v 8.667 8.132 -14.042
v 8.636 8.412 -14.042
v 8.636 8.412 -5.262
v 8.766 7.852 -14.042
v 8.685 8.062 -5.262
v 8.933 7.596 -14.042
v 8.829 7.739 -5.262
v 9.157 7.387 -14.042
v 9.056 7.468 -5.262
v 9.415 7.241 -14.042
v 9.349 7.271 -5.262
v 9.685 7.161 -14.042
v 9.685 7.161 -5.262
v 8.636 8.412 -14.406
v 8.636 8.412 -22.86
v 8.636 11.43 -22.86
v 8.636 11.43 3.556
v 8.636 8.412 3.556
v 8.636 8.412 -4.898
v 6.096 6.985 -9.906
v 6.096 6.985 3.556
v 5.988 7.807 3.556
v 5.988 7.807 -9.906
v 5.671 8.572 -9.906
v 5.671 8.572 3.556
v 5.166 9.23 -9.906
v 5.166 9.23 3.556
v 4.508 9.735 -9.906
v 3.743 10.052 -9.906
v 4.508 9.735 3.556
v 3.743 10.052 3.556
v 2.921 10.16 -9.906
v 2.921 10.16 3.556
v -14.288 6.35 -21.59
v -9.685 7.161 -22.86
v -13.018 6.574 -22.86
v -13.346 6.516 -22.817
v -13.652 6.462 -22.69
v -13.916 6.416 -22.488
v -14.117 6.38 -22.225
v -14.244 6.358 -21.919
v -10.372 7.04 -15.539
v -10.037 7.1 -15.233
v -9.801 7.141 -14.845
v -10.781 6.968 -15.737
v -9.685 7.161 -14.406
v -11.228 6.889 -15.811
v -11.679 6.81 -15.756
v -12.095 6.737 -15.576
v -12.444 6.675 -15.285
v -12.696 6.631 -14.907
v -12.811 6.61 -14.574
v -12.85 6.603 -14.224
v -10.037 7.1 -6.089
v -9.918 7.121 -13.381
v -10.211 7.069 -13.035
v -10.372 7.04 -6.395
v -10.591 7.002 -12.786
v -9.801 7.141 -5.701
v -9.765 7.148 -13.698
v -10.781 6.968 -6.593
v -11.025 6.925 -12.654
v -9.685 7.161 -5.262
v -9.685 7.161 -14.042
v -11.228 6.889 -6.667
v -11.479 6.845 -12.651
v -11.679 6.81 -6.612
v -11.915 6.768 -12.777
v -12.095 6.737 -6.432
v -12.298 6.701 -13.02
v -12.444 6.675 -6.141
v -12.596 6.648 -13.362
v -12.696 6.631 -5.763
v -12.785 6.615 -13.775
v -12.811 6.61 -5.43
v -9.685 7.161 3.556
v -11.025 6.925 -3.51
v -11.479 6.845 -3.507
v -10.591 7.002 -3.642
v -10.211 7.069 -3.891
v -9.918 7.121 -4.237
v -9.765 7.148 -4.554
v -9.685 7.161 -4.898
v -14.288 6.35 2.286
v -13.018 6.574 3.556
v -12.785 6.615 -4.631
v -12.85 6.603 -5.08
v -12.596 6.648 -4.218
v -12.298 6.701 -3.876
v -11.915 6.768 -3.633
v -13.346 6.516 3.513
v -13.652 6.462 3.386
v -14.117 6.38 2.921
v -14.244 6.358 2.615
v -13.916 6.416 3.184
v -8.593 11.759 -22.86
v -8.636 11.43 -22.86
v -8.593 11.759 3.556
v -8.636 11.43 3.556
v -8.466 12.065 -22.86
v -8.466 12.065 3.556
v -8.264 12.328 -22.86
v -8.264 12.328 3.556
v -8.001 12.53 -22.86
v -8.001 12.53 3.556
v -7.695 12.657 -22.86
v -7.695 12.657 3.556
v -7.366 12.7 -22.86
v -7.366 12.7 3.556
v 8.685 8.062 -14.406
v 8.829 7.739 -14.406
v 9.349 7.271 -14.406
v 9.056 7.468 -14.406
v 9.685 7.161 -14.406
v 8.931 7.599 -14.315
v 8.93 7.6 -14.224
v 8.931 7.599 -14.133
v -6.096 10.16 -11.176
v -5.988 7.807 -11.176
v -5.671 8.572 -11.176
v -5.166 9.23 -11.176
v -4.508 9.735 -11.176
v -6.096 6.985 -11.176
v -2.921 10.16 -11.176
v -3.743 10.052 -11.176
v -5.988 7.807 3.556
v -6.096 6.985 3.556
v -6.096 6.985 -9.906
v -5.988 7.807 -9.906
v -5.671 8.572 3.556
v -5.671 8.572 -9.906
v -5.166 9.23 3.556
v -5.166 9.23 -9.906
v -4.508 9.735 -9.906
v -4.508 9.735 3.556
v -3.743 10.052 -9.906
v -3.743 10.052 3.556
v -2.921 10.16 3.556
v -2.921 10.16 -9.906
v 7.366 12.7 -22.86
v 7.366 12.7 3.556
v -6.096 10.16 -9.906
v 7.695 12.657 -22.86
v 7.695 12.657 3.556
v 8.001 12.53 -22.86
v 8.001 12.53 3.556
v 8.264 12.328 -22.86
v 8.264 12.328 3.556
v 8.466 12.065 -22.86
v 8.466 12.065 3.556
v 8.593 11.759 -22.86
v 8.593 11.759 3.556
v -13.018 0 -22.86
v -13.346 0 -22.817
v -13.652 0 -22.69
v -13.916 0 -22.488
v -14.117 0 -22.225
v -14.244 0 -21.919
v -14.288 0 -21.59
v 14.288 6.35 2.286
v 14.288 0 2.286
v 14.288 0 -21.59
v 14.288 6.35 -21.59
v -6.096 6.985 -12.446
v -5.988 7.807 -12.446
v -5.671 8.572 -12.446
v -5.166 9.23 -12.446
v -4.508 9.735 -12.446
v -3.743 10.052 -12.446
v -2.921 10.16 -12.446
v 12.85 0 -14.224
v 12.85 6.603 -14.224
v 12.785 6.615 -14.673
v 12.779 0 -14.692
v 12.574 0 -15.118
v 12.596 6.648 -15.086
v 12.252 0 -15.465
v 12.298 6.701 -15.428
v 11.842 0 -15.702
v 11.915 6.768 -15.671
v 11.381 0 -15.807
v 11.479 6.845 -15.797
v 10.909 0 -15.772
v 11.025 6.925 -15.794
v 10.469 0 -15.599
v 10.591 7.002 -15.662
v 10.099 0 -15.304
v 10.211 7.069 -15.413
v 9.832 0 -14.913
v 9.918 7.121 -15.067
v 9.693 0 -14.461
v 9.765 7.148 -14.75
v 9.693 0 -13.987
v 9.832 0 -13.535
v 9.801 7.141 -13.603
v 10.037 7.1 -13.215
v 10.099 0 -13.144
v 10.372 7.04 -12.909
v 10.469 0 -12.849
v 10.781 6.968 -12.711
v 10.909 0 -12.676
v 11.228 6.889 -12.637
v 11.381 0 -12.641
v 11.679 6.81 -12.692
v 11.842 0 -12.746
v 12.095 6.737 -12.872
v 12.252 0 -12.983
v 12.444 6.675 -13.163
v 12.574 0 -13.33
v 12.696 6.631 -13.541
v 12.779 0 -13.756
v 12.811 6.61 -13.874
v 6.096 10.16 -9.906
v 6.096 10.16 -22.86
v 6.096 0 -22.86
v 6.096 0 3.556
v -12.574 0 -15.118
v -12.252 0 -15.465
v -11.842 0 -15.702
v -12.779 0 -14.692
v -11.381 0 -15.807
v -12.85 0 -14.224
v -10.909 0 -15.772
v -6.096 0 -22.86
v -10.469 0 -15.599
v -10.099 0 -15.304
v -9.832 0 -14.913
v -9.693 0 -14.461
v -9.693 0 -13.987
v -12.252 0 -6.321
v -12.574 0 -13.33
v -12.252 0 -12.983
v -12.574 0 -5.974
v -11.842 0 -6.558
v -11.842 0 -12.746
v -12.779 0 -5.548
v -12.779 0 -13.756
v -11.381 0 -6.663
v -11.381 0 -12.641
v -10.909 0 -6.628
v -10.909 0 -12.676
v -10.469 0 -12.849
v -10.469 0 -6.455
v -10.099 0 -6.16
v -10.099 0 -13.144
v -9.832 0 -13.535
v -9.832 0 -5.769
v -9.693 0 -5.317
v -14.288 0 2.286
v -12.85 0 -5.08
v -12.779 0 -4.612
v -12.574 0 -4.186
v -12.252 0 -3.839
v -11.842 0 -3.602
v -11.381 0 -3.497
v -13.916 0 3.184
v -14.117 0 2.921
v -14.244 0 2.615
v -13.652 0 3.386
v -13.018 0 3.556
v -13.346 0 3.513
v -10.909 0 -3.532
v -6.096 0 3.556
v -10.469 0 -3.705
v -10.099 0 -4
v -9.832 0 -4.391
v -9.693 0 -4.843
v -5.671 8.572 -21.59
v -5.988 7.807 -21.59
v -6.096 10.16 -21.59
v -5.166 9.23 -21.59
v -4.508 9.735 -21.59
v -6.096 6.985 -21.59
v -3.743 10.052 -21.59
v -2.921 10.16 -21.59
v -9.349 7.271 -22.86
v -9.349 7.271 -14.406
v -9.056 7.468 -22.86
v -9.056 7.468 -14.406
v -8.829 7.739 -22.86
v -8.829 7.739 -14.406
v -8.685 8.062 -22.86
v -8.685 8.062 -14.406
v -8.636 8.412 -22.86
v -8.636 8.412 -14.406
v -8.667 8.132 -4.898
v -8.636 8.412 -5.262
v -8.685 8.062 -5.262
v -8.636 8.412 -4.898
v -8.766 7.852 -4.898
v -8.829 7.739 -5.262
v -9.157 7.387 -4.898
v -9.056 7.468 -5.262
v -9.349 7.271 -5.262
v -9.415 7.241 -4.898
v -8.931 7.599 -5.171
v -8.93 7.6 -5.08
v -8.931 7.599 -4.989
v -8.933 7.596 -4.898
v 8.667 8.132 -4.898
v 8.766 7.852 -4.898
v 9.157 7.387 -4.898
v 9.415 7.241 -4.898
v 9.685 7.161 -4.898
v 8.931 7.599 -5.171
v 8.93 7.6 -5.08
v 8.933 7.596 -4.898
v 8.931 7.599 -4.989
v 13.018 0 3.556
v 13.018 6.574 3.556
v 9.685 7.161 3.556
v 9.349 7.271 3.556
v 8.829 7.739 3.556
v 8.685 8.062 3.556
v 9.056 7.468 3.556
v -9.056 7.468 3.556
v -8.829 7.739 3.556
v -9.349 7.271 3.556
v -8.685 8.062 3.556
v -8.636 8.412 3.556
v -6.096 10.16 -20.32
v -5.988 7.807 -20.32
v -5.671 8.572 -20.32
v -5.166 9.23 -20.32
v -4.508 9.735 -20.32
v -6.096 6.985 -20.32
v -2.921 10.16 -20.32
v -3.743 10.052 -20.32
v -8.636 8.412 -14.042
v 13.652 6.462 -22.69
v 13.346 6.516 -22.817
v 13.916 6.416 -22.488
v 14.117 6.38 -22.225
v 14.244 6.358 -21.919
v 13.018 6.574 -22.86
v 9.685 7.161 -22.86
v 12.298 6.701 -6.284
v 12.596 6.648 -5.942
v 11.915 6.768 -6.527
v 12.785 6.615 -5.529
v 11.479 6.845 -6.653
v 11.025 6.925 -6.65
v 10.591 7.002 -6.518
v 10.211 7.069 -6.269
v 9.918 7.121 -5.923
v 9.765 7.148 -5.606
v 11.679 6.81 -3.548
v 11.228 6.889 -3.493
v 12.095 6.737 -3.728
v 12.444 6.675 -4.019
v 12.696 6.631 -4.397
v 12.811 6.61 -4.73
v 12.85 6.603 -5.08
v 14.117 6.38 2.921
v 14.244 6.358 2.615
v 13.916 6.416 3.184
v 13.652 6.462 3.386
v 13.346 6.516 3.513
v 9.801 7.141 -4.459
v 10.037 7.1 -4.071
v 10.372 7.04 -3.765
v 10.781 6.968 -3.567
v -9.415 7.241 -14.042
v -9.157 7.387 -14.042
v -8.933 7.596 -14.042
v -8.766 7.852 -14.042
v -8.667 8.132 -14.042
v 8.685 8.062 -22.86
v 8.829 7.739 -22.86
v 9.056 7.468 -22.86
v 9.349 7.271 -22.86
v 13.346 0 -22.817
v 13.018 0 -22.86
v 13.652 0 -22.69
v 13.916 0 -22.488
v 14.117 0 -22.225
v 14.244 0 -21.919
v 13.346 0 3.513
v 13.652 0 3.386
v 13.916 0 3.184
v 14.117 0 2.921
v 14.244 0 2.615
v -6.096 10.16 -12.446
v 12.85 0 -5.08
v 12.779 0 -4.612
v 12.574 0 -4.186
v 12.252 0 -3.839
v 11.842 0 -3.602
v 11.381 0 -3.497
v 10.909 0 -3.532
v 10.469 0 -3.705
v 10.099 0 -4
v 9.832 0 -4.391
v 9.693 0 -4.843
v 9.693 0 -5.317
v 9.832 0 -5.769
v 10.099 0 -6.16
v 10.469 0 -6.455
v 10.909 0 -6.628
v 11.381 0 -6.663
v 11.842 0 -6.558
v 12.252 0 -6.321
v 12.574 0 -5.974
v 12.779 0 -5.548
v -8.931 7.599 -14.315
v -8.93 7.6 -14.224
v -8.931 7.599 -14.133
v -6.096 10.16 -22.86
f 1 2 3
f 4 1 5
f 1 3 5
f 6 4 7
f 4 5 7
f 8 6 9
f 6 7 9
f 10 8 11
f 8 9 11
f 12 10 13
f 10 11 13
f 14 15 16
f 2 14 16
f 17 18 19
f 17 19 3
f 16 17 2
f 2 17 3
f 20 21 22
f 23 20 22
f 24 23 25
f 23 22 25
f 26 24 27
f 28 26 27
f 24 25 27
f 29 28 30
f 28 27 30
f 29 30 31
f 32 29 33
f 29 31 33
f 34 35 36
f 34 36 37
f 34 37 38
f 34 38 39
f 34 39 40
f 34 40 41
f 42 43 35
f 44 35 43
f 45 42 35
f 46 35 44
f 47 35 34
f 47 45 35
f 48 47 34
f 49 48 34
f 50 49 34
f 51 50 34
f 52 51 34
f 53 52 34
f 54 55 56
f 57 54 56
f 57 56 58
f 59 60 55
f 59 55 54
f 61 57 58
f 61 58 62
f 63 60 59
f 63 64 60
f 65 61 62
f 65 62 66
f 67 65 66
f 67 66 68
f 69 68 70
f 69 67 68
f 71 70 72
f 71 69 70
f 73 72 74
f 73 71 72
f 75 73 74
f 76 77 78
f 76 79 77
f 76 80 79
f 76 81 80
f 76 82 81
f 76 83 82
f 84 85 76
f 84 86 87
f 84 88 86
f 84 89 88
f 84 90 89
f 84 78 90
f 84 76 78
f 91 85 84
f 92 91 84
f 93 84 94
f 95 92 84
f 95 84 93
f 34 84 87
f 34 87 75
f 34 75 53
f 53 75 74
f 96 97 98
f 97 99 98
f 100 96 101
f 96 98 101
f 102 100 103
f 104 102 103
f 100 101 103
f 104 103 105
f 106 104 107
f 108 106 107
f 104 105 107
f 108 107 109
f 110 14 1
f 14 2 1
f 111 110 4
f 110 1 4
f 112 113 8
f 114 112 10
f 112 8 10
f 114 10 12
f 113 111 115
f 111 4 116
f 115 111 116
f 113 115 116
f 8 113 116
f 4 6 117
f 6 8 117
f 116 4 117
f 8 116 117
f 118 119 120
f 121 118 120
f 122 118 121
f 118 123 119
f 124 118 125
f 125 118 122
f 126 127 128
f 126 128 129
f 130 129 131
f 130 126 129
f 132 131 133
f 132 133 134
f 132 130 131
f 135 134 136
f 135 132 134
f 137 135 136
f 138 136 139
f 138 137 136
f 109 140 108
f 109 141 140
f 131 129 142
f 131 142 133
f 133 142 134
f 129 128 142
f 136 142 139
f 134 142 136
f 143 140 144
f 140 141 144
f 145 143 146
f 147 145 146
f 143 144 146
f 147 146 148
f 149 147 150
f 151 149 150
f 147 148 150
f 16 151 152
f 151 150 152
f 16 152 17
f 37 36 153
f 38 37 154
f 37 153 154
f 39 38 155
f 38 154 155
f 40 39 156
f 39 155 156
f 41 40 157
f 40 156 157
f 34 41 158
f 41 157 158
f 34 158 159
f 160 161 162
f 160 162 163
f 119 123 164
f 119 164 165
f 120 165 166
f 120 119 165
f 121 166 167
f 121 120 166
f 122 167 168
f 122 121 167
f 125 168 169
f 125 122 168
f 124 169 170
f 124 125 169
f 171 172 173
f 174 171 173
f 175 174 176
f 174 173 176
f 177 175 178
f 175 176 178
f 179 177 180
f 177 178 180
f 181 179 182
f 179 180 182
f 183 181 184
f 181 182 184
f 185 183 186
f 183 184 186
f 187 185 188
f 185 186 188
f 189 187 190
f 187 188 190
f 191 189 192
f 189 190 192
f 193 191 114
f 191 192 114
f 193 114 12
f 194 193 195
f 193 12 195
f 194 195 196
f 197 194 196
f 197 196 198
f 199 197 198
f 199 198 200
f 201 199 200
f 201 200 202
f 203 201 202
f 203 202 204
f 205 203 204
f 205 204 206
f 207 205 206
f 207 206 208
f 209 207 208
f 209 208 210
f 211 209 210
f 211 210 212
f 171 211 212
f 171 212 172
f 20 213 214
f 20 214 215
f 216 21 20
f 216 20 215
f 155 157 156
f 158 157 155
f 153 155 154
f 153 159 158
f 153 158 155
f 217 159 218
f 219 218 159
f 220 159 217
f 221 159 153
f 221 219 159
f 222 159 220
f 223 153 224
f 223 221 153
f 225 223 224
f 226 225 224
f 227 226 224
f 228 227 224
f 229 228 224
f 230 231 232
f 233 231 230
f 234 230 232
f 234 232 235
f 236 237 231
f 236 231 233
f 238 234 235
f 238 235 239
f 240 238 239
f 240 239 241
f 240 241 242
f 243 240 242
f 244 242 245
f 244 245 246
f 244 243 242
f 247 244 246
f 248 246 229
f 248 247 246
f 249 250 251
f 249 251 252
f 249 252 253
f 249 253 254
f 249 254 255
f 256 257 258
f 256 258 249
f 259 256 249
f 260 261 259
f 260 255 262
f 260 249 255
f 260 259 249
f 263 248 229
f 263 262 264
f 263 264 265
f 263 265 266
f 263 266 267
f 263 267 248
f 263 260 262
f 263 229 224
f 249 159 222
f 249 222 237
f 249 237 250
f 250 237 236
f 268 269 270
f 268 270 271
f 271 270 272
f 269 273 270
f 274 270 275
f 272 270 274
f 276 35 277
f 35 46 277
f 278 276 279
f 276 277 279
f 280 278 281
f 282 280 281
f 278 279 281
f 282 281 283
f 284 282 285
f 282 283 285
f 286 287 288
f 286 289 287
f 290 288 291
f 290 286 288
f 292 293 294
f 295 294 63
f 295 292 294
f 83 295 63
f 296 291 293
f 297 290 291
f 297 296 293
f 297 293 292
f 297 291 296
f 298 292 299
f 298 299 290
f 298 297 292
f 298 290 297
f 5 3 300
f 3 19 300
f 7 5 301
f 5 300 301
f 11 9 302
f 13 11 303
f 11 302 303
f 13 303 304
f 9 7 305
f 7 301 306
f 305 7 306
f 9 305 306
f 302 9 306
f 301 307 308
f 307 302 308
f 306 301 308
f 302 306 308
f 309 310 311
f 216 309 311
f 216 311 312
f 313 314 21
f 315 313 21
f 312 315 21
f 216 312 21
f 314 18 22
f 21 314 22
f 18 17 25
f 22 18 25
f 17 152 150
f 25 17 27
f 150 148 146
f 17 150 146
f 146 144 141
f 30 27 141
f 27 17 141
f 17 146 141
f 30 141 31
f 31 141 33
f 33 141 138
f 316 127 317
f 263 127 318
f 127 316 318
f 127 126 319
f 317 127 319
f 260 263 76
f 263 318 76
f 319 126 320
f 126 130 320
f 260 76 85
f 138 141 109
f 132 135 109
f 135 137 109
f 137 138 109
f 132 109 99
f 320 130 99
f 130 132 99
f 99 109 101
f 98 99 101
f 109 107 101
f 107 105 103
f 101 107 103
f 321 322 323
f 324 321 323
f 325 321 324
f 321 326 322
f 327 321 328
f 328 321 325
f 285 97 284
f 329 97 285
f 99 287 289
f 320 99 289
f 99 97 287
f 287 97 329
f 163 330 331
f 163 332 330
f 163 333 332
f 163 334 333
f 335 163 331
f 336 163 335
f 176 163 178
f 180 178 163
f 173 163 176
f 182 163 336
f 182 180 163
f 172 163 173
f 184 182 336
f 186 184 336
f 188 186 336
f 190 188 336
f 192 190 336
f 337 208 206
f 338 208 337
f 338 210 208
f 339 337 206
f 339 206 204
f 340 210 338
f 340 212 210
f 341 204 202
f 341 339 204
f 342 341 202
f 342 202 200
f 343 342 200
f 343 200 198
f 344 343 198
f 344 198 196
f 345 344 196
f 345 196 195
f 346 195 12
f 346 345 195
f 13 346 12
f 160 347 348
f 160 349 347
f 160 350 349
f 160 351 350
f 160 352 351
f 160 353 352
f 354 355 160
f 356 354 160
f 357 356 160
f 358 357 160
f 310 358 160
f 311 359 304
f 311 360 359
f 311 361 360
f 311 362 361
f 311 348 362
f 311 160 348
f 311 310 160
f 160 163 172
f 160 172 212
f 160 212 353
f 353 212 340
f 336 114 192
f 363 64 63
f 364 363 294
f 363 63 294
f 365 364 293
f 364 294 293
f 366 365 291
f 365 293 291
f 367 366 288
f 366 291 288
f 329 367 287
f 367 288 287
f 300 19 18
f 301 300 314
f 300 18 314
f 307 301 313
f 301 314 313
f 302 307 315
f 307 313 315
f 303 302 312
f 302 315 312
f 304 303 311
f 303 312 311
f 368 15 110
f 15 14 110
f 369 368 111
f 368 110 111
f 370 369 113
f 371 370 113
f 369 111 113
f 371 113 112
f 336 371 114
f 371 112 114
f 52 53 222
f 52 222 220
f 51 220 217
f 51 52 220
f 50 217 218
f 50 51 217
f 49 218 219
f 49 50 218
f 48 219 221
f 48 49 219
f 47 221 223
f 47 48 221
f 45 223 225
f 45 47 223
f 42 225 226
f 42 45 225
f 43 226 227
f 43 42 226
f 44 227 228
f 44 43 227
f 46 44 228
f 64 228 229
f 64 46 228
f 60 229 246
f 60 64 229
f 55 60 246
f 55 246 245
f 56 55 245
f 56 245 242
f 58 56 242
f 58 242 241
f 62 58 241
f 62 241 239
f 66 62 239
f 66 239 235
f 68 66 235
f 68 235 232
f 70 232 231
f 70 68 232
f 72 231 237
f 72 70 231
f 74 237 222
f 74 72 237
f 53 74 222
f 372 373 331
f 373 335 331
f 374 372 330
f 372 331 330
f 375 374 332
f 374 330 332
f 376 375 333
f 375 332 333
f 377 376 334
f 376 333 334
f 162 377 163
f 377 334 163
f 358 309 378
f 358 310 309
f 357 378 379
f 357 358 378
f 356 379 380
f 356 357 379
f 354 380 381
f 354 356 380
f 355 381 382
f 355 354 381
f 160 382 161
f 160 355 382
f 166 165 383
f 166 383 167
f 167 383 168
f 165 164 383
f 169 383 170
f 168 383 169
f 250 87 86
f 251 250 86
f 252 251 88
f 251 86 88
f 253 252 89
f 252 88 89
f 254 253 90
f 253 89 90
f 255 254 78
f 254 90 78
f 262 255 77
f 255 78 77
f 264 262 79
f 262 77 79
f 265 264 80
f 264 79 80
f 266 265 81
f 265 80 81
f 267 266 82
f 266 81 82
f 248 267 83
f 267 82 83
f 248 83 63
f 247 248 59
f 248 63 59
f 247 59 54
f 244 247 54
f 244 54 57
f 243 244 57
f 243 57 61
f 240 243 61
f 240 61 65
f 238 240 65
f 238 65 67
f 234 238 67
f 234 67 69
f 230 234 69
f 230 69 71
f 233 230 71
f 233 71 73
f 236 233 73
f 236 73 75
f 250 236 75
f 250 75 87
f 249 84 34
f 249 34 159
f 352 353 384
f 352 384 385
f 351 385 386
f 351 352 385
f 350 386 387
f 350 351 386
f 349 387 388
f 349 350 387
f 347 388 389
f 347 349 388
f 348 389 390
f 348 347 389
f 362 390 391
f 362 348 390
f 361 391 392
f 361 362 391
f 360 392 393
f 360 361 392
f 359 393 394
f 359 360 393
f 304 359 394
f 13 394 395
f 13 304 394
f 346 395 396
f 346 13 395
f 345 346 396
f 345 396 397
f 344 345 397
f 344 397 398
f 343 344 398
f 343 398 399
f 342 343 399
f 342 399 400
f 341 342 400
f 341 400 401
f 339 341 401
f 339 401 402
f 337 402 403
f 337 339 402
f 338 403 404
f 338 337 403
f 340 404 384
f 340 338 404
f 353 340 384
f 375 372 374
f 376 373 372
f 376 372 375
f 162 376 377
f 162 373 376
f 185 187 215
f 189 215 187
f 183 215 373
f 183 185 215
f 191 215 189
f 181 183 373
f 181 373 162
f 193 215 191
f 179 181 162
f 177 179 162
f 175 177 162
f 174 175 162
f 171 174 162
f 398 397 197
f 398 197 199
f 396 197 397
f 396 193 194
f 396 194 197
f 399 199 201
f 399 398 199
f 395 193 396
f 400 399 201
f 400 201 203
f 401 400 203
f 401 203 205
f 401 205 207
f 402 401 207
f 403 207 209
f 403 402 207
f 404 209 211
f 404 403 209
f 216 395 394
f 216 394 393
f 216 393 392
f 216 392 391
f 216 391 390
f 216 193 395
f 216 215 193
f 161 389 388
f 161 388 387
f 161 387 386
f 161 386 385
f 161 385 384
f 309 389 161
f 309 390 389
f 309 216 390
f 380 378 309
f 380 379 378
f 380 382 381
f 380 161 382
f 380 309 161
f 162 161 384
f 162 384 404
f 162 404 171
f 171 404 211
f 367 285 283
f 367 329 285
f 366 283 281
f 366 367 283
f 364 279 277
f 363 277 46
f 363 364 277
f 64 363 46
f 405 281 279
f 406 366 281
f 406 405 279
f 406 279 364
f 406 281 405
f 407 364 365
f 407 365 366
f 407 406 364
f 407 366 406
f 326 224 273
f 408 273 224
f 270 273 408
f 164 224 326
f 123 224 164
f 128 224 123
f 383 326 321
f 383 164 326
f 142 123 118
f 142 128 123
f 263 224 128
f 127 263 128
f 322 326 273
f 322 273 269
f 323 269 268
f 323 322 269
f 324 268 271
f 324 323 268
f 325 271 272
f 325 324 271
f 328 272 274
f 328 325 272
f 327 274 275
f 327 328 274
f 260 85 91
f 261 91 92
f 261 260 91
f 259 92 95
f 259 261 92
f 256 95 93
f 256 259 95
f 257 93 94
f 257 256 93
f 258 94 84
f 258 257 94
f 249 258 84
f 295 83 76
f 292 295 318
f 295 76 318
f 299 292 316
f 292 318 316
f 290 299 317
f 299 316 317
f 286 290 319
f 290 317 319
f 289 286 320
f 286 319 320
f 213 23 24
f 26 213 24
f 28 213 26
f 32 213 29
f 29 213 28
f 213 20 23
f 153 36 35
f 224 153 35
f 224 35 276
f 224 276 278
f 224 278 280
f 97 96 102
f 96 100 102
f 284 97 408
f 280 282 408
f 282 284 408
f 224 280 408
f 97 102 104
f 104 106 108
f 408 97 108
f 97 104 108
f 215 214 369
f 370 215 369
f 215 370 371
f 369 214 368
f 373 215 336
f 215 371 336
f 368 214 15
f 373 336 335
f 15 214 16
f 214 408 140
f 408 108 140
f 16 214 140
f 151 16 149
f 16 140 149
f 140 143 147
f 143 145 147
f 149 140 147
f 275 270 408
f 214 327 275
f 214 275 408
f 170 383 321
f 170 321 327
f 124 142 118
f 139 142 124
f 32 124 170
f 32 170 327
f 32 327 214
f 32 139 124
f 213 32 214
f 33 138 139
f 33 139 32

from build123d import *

# Parameters (mm, degrees)
BOSS_EXTRUDE1_DEPTH      = 3.556
BOSS_EXTRUDE1_DEPTH_BACK = 22.86
BOSS_EXTRUDE2_DEPTH      = 13.462
BOSS_EXTRUDE3_START      = -1.27
BOSS_EXTRUDE3_DEPTH      = 1.905
FILLET1_R                = 1.27
BOSS_EXTRUDE4_DEPTH      = 8.509
CUT_EXTRUDE1_DEPTH       = 7.874


with BuildPart() as part:
    # Sketch1 → Boss-Extrude1 (new body, two sides)
    with BuildSketch(Plane.XY) as boss_extrude1_sk:
        Polygon((-6.096, 10.16), (6.096, 10.16), (6.096, 0), (14.2875, 0), (14.2875, 6.35), (8.636, 7.346511931), (8.636, 12.7), (-8.636, 12.7), (-8.636, 7.346511931), (-14.2875, 6.35), (-14.2875, 0), (-6.096, 0), align=None)
    extrude(amount=BOSS_EXTRUDE1_DEPTH)
    extrude(boss_extrude1_sk.sketch, amount=-BOSS_EXTRUDE1_DEPTH_BACK)

    # Sketch2 → Boss-Extrude2 (add)
    with BuildSketch(Plane.XY.offset(3.556)):
        with BuildLine():
            Line((2.921, 10.16), (6.096, 10.16))
            Line((6.096, 10.16), (6.096, 6.985))
            ThreePointArc((6.096, 6.985), (5.16606403, 9.23006403), (2.921, 10.16))
        make_face()
        with BuildLine():
            Line((-6.096, 10.16), (-6.096, 6.985))
            ThreePointArc((-6.096, 6.985), (-5.16606403, 9.23006403), (-2.921, 10.16))
            Line((-2.921, 10.16), (-6.096, 10.16))
        make_face()
    extrude(amount=-BOSS_EXTRUDE2_DEPTH)

    # Sketch3 → Boss-Extrude3 (add)
    with BuildSketch(Plane.XY.offset(-9.906).offset(BOSS_EXTRUDE3_START)):
        with BuildLine():
            Line((-6.096, 10.16), (-6.096, 6.985))
            ThreePointArc((-6.096, 6.985), (-5.16606403, 9.23006403), (-2.921, 10.16))
            Line((-2.921, 10.16), (-6.096, 10.16))
        make_face()
    extrude(amount=-BOSS_EXTRUDE3_DEPTH)

    # Sketch6 → Cut-Revolve1 (revolve, cut)
    with BuildSketch(Plane.XY.offset(-5.08)):
        Polygon((11.262482277, -1.27), (12.849982277, -1.27), (12.849982277, 6.60347316), (12.849982277, 9.423392242), (11.262482277, 9.423392242), (11.262482277, 6.883392242), align=None)
    cut_revolve1 = revolve(axis=Axis((11.262482277, -1.27, -5.08), (0, -1, 0)), mode=Mode.SUBTRACT)

    # Mirror1: Cut-Revolve1 across plane
    add(cut_revolve1.mirror(Plane(origin=(0, 0, 0), x_dir=(0, 0, 1), z_dir=(1, 0, 0))), mode=Mode.SUBTRACT)

    # Mirror2: Cut-Revolve1 across plane
    add(cut_revolve1.mirror(Plane.XY.offset(-9.652)), mode=Mode.SUBTRACT)

    # Mirror2 copy 1 sketch → Mirror2 copy 1 (revolve, cut)
    with BuildSketch(Plane(origin=(0, 0, -14.224), x_dir=(-1, 0, 0), z_dir=(0, 0, -1))):
        Polygon((11.262482277, -1.27), (12.849982277, -1.27), (12.849982277, 6.60347316), (12.849982277, 9.423392242), (11.262482277, 9.423392242), (11.262482277, 6.883392242), align=None)
    revolve(axis=Axis((-11.262482277, -1.27, -14.224), (0, -1, 0)), mode=Mode.SUBTRACT)

    # Fillet1
    fillet1_edges = [part.edges().sort_by_distance(p)[0] for p in [
        (14.2875, 3.175, 3.556),
        (-8.636, 7.346511931, -9.652),
        (-8.636, 12.7, -9.652),
        (8.636, 12.7, -9.652),
        (8.636, 7.346511931, -9.652),
        (-14.2875, 3.175, -22.86),
        (14.2875, 3.175, -22.86),
        (-14.2875, 3.175, 3.556),
    ]]
    fillet(fillet1_edges, radius=FILLET1_R)

    # Sketch4 → Boss-Extrude4 (add)
    with BuildSketch(Plane.XY.offset(-13.081)):
        with BuildLine():
            Line((-6.096, 10.16), (-6.096, 6.985))
            ThreePointArc((-6.096, 6.985), (-5.16606403, 9.23006403), (-2.921, 10.16))
            Line((-2.921, 10.16), (-6.096, 10.16))
        make_face()
    extrude(amount=-BOSS_EXTRUDE4_DEPTH)

    # Sketch9 → Cut-Extrude1 (cut)
    with BuildSketch(Plane.XY.offset(-12.446)):
        Polygon((-6.096, 6.985), (-5.987323019, 7.808582504), (-5.675836906, 8.563448168), (-5.16606403, 9.23006403), (-4.513044207, 9.732002047), (-3.747031782, 10.05066412), (-2.921, 10.16), (-6.096, 10.16), align=None)
    extrude(amount=-CUT_EXTRUDE1_DEPTH, mode=Mode.SUBTRACT)


solid = part.part
